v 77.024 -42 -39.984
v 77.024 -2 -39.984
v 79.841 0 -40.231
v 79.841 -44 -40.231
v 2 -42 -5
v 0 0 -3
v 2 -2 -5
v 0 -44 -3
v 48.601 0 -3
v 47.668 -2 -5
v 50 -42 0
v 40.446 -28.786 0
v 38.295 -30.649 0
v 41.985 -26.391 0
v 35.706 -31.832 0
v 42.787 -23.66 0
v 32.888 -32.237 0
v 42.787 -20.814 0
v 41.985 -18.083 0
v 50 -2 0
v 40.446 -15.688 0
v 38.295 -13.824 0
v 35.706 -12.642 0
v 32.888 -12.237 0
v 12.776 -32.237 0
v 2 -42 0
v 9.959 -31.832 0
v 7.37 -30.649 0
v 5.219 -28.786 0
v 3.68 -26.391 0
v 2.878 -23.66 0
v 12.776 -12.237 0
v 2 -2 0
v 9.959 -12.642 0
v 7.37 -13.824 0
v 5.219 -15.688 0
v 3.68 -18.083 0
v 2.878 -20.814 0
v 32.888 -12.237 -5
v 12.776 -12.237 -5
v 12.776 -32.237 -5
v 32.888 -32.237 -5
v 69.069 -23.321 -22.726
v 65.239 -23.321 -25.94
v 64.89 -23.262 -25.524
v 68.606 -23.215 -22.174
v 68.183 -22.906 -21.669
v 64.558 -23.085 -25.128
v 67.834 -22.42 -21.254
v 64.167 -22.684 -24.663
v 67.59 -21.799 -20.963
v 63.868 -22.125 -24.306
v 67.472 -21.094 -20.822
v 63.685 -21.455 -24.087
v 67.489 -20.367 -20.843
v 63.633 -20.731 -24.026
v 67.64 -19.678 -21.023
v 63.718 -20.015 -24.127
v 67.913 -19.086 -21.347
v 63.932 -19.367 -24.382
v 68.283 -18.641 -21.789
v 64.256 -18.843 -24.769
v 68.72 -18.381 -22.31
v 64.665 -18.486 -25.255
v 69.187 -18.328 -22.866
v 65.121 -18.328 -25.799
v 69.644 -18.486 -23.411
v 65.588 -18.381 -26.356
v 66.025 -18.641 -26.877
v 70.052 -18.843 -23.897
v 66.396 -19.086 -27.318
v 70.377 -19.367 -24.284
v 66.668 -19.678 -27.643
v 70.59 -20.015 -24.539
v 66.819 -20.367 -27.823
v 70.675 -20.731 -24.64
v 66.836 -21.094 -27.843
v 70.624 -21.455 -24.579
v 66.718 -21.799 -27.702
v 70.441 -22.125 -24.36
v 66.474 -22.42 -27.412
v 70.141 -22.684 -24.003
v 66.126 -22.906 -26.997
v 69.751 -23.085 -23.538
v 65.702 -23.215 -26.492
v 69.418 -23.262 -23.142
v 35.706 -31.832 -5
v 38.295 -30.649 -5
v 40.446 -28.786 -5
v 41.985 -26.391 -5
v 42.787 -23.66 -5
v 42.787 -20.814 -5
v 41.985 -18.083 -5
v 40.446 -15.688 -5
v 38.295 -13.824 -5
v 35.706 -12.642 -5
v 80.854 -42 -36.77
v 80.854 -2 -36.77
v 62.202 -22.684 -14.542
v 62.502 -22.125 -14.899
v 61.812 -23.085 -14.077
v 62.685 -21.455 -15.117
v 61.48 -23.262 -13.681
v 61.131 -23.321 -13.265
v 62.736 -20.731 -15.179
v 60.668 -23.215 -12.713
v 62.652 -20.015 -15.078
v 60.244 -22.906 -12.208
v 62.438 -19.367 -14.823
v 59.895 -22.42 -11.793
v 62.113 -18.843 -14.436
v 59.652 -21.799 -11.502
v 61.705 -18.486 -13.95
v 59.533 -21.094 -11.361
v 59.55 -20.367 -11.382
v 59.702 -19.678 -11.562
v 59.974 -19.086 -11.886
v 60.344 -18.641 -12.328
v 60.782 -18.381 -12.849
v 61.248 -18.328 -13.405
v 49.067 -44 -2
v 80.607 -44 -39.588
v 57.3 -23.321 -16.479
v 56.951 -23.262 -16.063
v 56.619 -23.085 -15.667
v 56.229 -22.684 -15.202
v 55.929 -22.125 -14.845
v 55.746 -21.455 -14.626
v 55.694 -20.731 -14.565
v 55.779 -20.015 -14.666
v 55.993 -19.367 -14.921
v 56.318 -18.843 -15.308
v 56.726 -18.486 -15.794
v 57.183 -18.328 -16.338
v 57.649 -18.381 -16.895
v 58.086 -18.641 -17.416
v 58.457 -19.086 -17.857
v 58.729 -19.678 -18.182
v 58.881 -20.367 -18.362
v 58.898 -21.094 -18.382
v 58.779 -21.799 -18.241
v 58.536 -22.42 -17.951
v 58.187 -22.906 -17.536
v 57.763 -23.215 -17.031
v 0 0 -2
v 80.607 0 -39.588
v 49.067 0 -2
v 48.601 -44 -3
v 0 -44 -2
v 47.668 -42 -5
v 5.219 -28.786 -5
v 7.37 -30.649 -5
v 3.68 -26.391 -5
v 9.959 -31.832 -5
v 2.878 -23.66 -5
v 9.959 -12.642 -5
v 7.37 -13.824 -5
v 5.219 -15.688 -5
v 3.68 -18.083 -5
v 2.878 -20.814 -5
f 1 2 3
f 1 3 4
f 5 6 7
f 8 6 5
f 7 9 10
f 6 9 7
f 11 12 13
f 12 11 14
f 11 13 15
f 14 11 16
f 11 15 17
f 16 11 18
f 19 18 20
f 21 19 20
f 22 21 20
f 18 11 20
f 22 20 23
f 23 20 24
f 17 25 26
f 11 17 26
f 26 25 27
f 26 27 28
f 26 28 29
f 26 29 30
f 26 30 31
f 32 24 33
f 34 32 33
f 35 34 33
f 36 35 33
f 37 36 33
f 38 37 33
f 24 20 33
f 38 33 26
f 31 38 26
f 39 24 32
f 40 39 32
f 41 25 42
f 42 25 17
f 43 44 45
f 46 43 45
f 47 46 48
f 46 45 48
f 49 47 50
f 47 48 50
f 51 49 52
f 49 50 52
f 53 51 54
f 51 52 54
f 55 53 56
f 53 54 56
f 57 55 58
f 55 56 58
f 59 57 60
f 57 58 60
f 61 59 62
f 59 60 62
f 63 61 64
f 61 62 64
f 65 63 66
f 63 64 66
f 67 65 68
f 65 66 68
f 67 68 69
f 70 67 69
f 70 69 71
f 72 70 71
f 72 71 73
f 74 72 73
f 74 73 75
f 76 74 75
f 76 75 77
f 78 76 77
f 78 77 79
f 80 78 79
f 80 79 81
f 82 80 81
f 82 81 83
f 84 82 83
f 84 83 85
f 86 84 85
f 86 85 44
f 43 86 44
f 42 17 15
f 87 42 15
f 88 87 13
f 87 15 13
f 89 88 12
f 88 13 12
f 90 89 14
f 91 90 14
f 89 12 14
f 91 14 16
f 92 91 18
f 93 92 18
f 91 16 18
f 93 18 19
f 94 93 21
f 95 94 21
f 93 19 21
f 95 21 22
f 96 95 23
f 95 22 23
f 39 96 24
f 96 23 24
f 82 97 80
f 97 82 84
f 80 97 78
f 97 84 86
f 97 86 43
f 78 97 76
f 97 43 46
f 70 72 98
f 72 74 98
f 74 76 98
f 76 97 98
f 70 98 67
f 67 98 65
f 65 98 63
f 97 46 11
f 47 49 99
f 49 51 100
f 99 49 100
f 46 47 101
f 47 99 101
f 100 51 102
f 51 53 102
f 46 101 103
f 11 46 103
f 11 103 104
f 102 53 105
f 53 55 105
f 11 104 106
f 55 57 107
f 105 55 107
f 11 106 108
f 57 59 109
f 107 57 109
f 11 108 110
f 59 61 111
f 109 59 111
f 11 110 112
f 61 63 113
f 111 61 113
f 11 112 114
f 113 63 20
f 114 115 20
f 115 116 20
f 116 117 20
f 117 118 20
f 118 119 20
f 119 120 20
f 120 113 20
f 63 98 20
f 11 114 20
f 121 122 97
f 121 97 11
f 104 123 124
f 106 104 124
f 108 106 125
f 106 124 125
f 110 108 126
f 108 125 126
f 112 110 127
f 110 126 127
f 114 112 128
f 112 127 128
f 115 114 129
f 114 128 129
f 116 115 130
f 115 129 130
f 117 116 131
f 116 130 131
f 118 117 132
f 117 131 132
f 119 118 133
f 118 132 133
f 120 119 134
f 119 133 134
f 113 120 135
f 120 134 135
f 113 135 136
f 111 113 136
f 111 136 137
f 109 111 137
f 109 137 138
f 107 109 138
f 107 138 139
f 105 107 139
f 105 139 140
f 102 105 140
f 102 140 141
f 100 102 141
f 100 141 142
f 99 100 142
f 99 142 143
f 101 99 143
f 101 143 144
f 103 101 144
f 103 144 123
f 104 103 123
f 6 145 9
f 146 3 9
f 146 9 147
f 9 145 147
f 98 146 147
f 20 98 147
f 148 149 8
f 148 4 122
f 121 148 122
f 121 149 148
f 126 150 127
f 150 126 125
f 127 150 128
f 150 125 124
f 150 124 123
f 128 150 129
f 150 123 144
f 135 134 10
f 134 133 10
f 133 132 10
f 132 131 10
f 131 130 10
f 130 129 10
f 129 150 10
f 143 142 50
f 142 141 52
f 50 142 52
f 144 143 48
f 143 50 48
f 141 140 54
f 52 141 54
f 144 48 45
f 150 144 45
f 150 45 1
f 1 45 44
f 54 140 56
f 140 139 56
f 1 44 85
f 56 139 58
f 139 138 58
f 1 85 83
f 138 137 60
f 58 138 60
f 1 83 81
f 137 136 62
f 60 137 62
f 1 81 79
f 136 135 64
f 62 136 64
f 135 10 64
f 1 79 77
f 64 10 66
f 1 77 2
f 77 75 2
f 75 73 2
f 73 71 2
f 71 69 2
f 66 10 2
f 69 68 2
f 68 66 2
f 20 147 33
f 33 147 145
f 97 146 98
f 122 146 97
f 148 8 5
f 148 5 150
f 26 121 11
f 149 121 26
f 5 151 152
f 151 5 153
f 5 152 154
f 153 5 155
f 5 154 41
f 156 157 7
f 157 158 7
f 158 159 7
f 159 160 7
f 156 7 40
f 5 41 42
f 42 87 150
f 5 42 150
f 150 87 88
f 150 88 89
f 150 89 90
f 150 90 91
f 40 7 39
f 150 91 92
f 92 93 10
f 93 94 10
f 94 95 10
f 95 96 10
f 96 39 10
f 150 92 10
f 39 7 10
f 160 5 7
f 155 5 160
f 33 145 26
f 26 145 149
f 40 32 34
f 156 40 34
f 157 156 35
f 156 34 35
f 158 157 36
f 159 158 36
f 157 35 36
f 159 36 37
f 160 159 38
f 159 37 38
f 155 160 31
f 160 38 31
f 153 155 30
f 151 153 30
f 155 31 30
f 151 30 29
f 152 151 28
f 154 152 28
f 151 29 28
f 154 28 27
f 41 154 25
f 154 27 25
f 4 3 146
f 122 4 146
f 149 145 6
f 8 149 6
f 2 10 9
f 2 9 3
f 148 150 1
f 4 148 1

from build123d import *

# Parameters (mm, degrees)
F1_DEPTH = 44
F3_DEPTH = 25
F5_D     = 5
F6_SIZE  = 2
F7_SIZE  = 2


with BuildPart() as f1:
    # F0 (on Front) → F1 (new body)
    with BuildSketch(Plane.XZ):
        Polygon((50, 0), (0, 0), (0, -5), (47.668462, -5), (78.309158, -41.51616), (82.13938, -38.302222), align=None)
    extrude(amount=F1_DEPTH)

    # F2 (on face) → F3 (cut)
    with BuildSketch(Plane.XY):
        with BuildLine():
            ThreePointArc((12.776074, -12.236962), (2.776074, -22.236962), (12.776074, -32.236962))
            Line((12.776074, -32.236962), (32.888483, -32.236962))
            ThreePointArc((32.888483, -32.236962), (42.888483, -22.236962), (32.888483, -12.236962))
            Line((32.888483, -12.236962), (12.776074, -12.236962))
        make_face()
    extrude(amount=-F3_DEPTH, mode=Mode.SUBTRACT)

    # F5 (through all)
    with Locations(Plane(origin=(29.341204, 0, 24.620194), x_dir=(0, 1, 0), z_dir=(0.766044, 0, 0.642788))):
        with Locations((-20.821171, -49.455423), (-20.821171, -61.805919)):
            Hole(F5_D / 2)

    # F6
    f6_edges = [f1.edges().sort_by_distance(p)[0] for p in [
        (66.06969, -44, -19.151111),
        (62.98881, -44, -23.25808),
        (78.309158, -22, -41.51616),
        (82.13938, -22, -38.302222),
        (66.06969, 0, -19.151111),
        (62.98881, 0, -23.25808),
    ]]
    chamfer(f6_edges, length=F6_SIZE)

    # F7
    f7_edges = [f1.edges().sort_by_distance(p)[0] for p in [
        (23.694593, 0, 0),
        (23.834231, 0, -5),
        (0, -22, 0),
        (0, -22, -5),
        (23.694593, -44, 0),
        (23.834231, -44, -5),
    ]]
    chamfer(f7_edges, length=F7_SIZE)


solid = f1.part
